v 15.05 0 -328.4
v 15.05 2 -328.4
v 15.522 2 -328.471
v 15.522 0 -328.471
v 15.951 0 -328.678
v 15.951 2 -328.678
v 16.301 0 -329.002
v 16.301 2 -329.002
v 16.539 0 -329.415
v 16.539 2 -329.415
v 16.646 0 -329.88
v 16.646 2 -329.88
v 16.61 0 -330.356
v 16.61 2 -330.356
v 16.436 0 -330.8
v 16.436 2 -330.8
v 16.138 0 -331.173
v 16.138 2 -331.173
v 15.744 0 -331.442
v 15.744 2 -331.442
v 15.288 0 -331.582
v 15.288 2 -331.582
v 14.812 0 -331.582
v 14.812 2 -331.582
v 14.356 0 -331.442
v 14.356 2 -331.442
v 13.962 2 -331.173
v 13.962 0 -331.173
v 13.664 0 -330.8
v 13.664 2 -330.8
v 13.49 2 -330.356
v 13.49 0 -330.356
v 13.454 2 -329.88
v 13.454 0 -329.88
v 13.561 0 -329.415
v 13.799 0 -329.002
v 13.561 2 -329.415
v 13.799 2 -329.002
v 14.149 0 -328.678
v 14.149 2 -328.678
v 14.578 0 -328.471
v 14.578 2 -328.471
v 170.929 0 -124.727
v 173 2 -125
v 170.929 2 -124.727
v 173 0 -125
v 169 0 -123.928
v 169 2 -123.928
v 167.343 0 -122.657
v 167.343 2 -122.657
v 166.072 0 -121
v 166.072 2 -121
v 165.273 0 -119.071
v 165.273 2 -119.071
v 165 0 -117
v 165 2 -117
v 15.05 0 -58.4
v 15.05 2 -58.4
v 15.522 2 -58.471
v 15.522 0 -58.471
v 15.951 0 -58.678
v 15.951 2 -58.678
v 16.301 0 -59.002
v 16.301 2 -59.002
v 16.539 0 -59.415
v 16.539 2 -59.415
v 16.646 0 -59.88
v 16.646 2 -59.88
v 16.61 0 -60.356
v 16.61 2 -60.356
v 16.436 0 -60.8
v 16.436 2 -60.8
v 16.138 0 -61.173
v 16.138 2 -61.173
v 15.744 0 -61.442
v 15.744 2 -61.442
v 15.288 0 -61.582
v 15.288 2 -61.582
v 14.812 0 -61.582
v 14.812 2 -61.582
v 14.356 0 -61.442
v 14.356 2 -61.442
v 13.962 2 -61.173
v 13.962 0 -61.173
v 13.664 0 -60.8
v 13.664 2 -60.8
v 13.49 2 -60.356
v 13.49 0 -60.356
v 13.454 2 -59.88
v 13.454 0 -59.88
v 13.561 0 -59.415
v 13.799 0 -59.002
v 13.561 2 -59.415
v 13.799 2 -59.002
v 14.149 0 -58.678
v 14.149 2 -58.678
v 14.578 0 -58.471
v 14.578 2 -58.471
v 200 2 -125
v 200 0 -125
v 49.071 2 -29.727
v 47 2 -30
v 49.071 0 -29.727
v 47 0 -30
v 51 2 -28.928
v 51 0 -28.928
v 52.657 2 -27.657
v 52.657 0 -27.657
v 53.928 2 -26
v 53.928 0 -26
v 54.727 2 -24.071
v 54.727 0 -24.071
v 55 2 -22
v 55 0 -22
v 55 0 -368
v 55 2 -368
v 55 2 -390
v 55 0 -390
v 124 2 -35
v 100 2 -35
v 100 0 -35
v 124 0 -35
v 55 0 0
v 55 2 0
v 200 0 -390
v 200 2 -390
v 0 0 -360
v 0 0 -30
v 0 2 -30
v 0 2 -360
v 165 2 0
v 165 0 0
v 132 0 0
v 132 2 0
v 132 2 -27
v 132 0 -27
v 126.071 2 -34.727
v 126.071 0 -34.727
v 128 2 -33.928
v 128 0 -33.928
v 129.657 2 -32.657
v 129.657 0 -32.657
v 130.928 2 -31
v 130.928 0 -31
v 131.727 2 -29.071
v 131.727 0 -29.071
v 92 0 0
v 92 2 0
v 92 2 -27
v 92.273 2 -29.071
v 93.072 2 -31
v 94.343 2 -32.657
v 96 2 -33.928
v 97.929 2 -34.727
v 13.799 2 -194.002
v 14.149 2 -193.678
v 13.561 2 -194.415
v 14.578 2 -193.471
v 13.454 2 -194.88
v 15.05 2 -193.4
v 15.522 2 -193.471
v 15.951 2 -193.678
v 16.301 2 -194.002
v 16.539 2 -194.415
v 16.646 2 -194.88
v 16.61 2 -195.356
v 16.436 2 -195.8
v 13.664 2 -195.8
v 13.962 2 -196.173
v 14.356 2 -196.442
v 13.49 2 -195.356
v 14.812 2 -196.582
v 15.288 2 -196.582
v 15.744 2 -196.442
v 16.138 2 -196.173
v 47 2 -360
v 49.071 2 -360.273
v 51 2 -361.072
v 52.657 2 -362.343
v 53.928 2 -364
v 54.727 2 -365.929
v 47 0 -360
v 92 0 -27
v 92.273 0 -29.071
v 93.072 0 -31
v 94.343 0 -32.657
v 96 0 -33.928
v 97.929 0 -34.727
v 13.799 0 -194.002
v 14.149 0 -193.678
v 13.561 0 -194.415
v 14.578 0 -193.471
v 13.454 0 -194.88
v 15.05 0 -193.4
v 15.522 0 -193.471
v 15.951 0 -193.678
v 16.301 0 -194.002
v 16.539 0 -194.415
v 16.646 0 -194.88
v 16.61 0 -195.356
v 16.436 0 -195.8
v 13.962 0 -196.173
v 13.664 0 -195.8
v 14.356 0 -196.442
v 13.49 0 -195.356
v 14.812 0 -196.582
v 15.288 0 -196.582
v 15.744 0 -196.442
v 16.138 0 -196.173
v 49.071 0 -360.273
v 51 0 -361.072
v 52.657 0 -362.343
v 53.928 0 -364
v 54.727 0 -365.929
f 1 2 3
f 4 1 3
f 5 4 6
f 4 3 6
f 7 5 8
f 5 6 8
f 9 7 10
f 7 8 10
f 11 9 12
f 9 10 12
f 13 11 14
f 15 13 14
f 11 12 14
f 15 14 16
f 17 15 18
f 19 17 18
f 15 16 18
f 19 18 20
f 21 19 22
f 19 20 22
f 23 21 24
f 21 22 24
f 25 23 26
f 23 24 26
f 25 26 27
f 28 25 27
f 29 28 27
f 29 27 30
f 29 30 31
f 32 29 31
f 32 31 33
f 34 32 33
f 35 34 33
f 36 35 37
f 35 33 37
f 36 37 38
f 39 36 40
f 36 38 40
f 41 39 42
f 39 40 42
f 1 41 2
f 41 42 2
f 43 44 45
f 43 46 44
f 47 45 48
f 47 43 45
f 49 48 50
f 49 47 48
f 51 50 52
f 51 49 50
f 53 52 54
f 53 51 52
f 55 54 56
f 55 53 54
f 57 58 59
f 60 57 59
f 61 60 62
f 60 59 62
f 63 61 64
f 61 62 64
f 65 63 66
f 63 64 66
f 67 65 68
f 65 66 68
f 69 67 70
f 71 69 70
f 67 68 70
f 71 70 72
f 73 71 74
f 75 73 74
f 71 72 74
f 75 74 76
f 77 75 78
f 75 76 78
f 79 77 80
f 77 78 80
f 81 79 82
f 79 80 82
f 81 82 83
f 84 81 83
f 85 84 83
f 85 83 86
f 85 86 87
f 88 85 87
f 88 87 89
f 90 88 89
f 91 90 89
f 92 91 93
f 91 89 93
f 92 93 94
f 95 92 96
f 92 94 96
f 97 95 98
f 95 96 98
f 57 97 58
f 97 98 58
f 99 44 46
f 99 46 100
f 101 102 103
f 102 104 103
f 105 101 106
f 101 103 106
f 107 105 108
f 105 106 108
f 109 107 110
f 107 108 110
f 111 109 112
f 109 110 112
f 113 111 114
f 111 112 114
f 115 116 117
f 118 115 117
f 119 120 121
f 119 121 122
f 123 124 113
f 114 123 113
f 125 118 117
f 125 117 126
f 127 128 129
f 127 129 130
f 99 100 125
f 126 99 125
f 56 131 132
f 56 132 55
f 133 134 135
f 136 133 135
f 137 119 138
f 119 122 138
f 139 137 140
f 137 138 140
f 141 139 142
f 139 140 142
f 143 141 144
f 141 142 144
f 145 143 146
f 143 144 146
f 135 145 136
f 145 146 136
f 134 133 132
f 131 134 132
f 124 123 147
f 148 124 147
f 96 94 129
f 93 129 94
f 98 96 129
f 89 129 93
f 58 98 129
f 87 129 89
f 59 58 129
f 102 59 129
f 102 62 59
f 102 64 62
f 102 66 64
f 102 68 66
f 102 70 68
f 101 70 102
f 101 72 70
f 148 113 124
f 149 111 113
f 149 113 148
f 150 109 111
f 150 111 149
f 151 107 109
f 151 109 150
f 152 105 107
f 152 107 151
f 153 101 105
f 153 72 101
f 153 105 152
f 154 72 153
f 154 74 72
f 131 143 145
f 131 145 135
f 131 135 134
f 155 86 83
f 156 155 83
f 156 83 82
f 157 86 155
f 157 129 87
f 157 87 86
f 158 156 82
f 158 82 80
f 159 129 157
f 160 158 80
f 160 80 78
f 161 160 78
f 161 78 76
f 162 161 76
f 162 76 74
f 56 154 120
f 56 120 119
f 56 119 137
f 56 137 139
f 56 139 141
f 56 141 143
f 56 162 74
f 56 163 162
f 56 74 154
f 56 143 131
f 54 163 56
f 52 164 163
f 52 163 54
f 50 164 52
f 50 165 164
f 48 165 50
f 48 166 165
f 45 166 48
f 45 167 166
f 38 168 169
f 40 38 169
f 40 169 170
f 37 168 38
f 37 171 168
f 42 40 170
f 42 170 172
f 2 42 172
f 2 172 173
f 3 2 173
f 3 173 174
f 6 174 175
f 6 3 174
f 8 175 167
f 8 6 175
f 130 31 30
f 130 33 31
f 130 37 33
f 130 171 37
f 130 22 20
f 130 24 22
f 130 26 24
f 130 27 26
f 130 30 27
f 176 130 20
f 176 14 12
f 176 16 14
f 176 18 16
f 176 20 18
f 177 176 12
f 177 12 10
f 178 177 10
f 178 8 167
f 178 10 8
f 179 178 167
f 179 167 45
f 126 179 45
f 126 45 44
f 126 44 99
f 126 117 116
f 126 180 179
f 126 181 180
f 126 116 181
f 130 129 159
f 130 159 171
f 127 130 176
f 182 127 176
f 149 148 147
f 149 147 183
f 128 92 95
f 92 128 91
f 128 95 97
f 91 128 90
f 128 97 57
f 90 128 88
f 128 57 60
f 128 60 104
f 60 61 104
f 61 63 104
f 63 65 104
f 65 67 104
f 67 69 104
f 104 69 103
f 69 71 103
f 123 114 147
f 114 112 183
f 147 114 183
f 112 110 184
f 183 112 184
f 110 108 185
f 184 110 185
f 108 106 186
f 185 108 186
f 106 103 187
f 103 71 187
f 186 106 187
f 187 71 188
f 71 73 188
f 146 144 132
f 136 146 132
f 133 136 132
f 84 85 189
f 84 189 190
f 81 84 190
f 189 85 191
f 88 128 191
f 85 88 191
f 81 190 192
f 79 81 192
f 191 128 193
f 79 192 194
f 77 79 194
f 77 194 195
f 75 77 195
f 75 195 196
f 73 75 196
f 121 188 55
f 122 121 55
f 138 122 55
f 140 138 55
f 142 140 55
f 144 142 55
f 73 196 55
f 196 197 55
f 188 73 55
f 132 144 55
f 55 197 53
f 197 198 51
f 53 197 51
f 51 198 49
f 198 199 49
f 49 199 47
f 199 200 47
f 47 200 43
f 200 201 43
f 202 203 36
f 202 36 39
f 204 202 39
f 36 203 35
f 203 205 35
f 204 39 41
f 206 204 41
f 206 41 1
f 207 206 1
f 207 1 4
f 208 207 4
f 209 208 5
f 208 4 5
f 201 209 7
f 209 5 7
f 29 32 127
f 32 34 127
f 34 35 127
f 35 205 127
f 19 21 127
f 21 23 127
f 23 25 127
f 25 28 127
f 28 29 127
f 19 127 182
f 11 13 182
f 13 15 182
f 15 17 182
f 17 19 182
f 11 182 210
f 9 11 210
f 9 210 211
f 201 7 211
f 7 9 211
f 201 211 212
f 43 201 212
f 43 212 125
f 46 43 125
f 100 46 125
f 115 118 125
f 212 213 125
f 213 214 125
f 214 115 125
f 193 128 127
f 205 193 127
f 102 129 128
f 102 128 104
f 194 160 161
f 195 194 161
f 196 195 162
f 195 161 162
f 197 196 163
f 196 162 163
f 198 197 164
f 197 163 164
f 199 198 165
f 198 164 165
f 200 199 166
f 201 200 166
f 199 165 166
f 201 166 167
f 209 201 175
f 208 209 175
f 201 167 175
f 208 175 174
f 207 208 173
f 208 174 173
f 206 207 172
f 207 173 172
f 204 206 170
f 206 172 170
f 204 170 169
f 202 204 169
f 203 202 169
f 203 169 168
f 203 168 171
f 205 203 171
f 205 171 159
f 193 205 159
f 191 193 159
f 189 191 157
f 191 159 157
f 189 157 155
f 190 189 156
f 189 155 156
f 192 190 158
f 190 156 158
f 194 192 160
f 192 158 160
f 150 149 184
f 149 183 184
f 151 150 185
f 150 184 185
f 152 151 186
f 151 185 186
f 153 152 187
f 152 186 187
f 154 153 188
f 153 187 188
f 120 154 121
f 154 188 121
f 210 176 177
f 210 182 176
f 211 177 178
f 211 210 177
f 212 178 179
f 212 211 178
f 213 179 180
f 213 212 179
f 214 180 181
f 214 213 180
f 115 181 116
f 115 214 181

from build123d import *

# Parameters (mm, degrees)
CROQUIS1_W              = 200
CROQUIS1_H              = 390
SALIENTE_EXTRUIR1_DEPTH = 2
CROQUIS3_W              = 55
CROQUIS3_H              = 30
CORTAR_EXTRUIR1_DEPTH   = 2
CROQUIS5_W              = 40
CROQUIS5_H              = 35
CORTAR_EXTRUIR3_DEPTH   = 2
CROQUIS6_W              = 35
CROQUIS6_H              = 125
CORTAR_EXTRUIR4_DEPTH   = 2
CROQUIS7_R              = 1.6
CORTAR_EXTRUIR5_DEPTH   = 2
REDONDEO1_R             = 8


with BuildPart() as part:
    # Croquis1 → Saliente-Extruir1 (new body)
    with BuildSketch(Plane(origin=(0, 0, 0), x_dir=(1, 0, 0), z_dir=(0, 1, 0))):
        with Locations((100, 195)):
            Rectangle(CROQUIS1_W, CROQUIS1_H)
    extrude(amount=SALIENTE_EXTRUIR1_DEPTH)

    # Croquis3 → Cortar-Extruir1 (cut)
    with BuildSketch(Plane(origin=(0, 2, 0), x_dir=(1, 0, 0), z_dir=(0, 1, 0))):
        with Locations((27.5, 375)):
            Rectangle(CROQUIS3_W, CROQUIS3_H)
        with Locations((27.5, 15)):
            Rectangle(CROQUIS3_W, CROQUIS3_H)
    extrude(amount=-CORTAR_EXTRUIR1_DEPTH, mode=Mode.SUBTRACT)

    # Croquis5 → Cortar-Extruir3 (cut)
    with BuildSketch(Plane(origin=(0, 2, 0), x_dir=(1, 0, 0), z_dir=(0, 1, 0))):
        with Locations((112, 17.5)):
            Rectangle(CROQUIS5_W, CROQUIS5_H)
    extrude(amount=-CORTAR_EXTRUIR3_DEPTH, mode=Mode.SUBTRACT)

    # Croquis6 → Cortar-Extruir4 (cut)
    with BuildSketch(Plane(origin=(0, 2, 0), x_dir=(1, 0, 0), z_dir=(0, 1, 0))):
        with Locations((182.5, 62.5)):
            Rectangle(CROQUIS6_W, CROQUIS6_H)
    extrude(amount=-CORTAR_EXTRUIR4_DEPTH, mode=Mode.SUBTRACT)

    # Croquis7 → Cortar-Extruir5 (cut)
    with BuildSketch(Plane(origin=(0, 2, 0), x_dir=(1, 0, 0), z_dir=(0, 1, 0))):
        with Locations(Location((15.05, 330, 0), (0, 0, 270))):
            Circle(CROQUIS7_R)
        with Locations(Location((15.05, 195, 0), (0, 0, 270))):
            Circle(CROQUIS7_R)
        with Locations(Location((15.05, 60, 0), (0, 0, 270))):
            Circle(CROQUIS7_R)
    extrude(amount=-CORTAR_EXTRUIR5_DEPTH, mode=Mode.SUBTRACT)

    # Redondeo1
    redondeo1_edges = [part.edges().sort_by_distance(p)[0] for p in [
        (55, 1, -360),
        (55, 1, -30),
        (132, 1, -35),
        (92, 1, -35),
        (165, 1, -125),
    ]]
    fillet(redondeo1_edges, radius=REDONDEO1_R)


solid = part.part
